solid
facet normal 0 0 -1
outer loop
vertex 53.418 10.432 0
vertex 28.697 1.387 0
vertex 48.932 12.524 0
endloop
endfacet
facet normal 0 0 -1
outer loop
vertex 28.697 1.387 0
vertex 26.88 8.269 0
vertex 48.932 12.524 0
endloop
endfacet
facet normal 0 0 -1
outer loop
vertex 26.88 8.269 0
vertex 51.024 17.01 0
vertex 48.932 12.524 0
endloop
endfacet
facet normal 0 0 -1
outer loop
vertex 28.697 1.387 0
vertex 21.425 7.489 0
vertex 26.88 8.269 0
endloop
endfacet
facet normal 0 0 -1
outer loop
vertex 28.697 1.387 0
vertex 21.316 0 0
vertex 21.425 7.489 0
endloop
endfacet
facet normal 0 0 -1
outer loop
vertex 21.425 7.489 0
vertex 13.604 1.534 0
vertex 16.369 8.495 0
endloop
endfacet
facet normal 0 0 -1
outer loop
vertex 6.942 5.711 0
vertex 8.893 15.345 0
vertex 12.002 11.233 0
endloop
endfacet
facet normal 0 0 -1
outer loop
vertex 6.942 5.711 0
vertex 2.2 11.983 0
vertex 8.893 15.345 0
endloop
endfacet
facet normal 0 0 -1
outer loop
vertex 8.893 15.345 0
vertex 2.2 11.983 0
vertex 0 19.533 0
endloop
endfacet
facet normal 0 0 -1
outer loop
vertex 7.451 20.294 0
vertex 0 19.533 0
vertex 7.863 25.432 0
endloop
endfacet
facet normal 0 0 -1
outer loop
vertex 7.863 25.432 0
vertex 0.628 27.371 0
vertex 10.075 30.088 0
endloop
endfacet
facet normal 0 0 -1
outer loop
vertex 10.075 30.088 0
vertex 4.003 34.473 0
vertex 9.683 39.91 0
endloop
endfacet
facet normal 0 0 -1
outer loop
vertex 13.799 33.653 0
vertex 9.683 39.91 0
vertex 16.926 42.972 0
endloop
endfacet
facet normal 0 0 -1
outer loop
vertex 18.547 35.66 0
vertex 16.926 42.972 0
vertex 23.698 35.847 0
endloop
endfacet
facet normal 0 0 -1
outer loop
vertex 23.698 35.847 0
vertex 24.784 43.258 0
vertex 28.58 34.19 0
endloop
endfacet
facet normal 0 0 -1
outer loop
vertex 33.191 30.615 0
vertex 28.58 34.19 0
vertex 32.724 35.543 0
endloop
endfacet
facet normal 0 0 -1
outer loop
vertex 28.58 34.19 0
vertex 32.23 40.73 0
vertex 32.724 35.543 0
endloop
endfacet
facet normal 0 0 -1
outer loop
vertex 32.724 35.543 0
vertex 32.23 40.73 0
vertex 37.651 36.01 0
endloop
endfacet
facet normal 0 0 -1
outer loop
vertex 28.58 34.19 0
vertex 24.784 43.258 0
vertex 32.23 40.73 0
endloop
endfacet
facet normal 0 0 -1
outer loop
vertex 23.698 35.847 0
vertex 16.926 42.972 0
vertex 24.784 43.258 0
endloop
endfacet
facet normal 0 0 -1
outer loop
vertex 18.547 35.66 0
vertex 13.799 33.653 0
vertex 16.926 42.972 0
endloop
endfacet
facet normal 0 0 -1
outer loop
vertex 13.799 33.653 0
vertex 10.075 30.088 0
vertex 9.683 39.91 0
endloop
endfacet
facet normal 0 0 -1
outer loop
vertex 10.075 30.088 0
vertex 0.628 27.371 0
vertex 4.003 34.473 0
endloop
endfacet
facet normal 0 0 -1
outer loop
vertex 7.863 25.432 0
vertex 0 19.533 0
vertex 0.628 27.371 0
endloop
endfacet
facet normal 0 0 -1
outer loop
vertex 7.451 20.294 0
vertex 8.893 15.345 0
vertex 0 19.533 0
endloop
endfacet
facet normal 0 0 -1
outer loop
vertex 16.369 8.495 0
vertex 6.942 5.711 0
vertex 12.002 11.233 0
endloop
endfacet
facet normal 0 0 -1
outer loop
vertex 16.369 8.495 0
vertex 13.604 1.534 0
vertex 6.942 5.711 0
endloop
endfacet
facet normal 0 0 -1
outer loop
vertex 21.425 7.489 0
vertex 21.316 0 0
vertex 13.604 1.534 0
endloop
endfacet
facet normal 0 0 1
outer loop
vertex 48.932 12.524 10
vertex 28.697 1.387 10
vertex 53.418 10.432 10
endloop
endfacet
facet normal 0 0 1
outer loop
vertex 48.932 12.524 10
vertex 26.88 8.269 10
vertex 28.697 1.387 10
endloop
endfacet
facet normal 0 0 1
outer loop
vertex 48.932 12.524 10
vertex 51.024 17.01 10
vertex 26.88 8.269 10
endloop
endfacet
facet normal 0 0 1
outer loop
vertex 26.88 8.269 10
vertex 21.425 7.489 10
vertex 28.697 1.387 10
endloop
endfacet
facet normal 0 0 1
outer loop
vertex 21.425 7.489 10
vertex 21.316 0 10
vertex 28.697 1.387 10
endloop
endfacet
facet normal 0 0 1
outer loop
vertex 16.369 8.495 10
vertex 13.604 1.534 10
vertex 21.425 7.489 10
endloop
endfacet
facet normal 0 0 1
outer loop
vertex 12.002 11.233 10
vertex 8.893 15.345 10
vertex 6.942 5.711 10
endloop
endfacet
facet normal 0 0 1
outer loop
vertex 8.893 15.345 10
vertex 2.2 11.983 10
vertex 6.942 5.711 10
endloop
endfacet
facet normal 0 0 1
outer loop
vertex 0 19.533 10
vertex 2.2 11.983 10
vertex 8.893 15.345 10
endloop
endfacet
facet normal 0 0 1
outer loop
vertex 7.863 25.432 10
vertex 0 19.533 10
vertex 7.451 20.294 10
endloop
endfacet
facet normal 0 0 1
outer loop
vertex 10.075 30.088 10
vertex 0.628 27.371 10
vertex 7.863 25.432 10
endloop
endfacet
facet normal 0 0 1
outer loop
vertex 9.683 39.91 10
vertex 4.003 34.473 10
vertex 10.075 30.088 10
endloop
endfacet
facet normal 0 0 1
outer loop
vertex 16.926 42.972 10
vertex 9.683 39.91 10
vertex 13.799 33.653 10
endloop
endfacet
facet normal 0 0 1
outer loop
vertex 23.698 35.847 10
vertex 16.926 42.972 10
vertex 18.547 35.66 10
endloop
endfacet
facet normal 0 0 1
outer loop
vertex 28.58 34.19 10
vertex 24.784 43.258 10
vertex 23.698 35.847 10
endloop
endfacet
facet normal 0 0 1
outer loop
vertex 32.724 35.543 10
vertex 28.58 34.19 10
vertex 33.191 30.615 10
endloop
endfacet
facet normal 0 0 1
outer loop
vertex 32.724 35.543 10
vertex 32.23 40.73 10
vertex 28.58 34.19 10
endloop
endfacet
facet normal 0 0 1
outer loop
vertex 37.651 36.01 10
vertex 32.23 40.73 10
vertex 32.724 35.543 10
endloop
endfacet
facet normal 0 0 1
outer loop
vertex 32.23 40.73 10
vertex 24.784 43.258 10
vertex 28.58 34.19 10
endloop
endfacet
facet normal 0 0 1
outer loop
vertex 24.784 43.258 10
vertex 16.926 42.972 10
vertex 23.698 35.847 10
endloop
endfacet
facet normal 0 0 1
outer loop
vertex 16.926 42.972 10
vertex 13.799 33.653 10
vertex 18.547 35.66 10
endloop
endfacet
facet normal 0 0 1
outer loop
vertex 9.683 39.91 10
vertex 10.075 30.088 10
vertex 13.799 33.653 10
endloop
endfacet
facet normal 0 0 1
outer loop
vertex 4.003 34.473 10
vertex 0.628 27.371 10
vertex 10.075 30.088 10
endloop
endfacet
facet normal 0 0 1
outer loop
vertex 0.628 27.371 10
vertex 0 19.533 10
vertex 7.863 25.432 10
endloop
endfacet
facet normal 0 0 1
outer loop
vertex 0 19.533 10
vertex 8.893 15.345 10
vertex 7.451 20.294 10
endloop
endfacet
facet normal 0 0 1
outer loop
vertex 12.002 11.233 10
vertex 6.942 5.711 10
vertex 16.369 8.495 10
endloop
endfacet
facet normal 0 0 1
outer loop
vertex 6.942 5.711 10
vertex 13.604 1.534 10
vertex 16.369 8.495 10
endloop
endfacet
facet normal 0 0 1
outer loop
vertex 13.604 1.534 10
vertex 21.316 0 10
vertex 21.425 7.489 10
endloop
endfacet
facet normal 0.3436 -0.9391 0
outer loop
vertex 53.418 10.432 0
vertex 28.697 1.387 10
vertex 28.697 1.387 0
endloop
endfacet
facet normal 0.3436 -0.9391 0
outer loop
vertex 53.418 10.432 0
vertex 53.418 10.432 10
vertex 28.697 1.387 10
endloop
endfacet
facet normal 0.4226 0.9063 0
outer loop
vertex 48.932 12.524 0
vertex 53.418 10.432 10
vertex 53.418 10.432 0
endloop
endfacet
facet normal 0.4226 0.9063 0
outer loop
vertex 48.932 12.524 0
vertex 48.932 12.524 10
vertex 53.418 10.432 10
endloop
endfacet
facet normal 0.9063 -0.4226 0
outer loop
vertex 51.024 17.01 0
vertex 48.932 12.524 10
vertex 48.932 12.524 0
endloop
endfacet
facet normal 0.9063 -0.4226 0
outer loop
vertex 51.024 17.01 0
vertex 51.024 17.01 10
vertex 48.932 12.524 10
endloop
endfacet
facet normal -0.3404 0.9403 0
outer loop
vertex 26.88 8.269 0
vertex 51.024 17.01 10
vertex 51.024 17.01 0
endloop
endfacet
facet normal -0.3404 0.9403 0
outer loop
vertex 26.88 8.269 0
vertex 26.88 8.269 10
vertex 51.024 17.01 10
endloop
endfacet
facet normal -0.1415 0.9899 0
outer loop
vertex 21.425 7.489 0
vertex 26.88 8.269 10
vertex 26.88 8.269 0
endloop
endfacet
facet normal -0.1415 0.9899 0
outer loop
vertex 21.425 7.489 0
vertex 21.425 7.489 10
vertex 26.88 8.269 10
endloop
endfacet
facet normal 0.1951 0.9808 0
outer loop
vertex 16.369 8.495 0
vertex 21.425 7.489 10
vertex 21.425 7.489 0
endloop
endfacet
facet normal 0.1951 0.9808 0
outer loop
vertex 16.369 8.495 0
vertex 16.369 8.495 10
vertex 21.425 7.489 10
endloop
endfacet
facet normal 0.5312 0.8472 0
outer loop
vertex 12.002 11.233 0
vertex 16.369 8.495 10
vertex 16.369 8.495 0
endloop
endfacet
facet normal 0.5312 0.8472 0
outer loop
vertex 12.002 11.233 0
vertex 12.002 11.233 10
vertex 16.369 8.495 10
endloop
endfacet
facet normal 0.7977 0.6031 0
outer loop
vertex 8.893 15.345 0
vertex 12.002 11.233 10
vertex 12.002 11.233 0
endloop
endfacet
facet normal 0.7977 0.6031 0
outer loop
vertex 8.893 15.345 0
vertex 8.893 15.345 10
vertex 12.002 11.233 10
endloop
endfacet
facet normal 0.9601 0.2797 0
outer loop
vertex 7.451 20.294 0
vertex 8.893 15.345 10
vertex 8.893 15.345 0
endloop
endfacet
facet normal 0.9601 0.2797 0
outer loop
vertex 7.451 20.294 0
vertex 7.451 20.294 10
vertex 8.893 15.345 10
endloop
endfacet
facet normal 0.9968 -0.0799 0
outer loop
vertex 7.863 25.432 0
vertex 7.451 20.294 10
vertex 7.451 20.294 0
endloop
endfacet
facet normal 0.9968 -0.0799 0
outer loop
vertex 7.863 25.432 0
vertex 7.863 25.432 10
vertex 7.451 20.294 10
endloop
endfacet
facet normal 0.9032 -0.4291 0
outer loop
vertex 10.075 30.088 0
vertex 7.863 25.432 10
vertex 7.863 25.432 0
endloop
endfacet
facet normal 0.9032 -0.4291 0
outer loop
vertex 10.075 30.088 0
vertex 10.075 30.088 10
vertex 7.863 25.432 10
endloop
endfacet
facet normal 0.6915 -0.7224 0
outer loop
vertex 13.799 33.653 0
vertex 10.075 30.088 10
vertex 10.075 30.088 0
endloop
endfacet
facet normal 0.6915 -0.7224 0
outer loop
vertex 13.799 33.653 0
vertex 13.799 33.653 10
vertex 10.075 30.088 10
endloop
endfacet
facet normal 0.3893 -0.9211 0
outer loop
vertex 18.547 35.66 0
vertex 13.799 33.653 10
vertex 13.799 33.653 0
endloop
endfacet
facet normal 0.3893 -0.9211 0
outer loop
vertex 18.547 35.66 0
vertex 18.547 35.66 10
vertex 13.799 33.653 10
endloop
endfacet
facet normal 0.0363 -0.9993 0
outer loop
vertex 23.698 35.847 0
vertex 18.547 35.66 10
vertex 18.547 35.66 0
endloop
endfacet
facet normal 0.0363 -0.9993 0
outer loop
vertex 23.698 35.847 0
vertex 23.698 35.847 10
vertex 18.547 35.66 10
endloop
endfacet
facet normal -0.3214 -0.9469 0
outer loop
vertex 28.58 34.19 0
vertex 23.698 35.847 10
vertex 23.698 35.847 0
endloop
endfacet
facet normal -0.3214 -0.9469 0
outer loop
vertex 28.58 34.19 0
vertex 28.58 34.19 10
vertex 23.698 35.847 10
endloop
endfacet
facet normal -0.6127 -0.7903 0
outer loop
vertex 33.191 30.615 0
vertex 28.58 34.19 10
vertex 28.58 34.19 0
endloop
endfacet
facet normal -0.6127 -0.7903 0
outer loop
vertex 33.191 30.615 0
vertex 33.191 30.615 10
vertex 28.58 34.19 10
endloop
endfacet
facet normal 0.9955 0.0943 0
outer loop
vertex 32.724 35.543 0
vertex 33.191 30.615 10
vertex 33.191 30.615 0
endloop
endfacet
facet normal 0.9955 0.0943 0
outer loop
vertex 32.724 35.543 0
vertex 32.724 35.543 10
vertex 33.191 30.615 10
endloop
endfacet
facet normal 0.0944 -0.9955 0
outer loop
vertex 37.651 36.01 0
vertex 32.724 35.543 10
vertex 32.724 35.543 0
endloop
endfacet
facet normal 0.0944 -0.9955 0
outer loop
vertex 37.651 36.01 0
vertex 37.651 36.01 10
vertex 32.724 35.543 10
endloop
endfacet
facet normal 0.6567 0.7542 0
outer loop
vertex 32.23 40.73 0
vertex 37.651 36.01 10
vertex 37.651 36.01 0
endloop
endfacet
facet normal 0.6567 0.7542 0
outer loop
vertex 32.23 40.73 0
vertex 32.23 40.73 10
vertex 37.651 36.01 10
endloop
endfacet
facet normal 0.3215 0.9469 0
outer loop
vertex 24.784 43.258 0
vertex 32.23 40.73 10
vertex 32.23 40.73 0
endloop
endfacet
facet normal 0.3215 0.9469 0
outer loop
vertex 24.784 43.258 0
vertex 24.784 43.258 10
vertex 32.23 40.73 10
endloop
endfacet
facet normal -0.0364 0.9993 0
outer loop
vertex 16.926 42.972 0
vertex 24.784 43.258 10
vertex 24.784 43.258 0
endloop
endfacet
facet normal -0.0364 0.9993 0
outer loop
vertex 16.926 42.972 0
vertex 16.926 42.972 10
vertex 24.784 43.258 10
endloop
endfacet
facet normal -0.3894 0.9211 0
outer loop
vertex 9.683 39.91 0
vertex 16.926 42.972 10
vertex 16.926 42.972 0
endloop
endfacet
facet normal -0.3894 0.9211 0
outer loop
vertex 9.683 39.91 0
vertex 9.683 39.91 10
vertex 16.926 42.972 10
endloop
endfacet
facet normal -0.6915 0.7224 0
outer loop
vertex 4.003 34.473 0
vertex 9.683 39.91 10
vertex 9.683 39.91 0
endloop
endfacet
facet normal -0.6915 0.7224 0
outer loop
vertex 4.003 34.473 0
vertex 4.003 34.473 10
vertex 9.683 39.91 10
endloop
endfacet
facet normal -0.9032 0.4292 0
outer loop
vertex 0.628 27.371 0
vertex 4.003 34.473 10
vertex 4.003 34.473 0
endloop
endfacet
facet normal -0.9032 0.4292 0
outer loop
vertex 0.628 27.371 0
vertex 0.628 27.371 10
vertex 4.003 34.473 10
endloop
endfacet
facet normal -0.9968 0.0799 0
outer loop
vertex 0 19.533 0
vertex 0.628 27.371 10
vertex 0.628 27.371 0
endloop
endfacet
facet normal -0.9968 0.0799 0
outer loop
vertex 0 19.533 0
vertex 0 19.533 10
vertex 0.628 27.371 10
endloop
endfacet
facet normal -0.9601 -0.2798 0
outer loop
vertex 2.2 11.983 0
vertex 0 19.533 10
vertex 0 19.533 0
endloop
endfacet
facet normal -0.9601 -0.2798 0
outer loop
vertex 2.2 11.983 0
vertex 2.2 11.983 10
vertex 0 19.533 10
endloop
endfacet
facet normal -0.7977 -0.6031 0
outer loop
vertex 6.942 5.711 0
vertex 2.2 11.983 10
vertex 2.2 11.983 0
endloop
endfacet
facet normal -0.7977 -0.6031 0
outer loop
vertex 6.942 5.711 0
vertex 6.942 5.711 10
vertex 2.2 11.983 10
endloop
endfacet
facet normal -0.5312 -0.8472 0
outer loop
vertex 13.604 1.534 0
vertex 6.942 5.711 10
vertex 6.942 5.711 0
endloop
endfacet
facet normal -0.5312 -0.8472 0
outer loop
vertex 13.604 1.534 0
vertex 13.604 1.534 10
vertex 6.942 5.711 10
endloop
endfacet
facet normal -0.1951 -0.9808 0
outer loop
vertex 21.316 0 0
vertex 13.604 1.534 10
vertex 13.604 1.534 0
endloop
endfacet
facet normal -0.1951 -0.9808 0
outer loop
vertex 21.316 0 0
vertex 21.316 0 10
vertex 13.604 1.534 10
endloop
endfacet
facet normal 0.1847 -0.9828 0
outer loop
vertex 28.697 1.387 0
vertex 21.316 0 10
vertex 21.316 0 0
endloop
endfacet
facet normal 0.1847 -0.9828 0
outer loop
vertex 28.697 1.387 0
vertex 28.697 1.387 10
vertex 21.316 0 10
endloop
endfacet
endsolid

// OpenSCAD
$fn = 32;

// ----------------------------------------------------------------------
// Eye lug: ring_tail, 10 mm thick
// ----------------------------------------------------------------------

// --- parameters (mm) ---
profile_height = 10;      // extrusion height
profile_points = 30;      // points of the closed outline

profile = [[32.724, 35.543], [37.651, 36.01], [32.23, 40.73], [24.784, 43.258], [16.926, 42.972], [9.683, 39.91], [4.003, 34.473], [0.628, 27.371], [0, 19.533], [2.2, 11.983], [6.942, 5.711], [13.604, 1.534], [21.316, 0], [28.697, 1.387], [53.418, 10.432], [48.932, 12.524], [51.024, 17.01], [26.88, 8.269], [21.425, 7.489], [16.369, 8.495], [12.002, 11.233], [8.893, 15.345], [7.451, 20.294], [7.863, 25.432], [10.075, 30.088], [13.799, 33.653], [18.547, 35.66], [23.698, 35.847], [28.58, 34.19], [33.191, 30.615]];  // single closed polygon, 30 points, counter clockwise

// --- the one profile operation ---
linear_extrude(height = profile_height) polygon(points = profile);
